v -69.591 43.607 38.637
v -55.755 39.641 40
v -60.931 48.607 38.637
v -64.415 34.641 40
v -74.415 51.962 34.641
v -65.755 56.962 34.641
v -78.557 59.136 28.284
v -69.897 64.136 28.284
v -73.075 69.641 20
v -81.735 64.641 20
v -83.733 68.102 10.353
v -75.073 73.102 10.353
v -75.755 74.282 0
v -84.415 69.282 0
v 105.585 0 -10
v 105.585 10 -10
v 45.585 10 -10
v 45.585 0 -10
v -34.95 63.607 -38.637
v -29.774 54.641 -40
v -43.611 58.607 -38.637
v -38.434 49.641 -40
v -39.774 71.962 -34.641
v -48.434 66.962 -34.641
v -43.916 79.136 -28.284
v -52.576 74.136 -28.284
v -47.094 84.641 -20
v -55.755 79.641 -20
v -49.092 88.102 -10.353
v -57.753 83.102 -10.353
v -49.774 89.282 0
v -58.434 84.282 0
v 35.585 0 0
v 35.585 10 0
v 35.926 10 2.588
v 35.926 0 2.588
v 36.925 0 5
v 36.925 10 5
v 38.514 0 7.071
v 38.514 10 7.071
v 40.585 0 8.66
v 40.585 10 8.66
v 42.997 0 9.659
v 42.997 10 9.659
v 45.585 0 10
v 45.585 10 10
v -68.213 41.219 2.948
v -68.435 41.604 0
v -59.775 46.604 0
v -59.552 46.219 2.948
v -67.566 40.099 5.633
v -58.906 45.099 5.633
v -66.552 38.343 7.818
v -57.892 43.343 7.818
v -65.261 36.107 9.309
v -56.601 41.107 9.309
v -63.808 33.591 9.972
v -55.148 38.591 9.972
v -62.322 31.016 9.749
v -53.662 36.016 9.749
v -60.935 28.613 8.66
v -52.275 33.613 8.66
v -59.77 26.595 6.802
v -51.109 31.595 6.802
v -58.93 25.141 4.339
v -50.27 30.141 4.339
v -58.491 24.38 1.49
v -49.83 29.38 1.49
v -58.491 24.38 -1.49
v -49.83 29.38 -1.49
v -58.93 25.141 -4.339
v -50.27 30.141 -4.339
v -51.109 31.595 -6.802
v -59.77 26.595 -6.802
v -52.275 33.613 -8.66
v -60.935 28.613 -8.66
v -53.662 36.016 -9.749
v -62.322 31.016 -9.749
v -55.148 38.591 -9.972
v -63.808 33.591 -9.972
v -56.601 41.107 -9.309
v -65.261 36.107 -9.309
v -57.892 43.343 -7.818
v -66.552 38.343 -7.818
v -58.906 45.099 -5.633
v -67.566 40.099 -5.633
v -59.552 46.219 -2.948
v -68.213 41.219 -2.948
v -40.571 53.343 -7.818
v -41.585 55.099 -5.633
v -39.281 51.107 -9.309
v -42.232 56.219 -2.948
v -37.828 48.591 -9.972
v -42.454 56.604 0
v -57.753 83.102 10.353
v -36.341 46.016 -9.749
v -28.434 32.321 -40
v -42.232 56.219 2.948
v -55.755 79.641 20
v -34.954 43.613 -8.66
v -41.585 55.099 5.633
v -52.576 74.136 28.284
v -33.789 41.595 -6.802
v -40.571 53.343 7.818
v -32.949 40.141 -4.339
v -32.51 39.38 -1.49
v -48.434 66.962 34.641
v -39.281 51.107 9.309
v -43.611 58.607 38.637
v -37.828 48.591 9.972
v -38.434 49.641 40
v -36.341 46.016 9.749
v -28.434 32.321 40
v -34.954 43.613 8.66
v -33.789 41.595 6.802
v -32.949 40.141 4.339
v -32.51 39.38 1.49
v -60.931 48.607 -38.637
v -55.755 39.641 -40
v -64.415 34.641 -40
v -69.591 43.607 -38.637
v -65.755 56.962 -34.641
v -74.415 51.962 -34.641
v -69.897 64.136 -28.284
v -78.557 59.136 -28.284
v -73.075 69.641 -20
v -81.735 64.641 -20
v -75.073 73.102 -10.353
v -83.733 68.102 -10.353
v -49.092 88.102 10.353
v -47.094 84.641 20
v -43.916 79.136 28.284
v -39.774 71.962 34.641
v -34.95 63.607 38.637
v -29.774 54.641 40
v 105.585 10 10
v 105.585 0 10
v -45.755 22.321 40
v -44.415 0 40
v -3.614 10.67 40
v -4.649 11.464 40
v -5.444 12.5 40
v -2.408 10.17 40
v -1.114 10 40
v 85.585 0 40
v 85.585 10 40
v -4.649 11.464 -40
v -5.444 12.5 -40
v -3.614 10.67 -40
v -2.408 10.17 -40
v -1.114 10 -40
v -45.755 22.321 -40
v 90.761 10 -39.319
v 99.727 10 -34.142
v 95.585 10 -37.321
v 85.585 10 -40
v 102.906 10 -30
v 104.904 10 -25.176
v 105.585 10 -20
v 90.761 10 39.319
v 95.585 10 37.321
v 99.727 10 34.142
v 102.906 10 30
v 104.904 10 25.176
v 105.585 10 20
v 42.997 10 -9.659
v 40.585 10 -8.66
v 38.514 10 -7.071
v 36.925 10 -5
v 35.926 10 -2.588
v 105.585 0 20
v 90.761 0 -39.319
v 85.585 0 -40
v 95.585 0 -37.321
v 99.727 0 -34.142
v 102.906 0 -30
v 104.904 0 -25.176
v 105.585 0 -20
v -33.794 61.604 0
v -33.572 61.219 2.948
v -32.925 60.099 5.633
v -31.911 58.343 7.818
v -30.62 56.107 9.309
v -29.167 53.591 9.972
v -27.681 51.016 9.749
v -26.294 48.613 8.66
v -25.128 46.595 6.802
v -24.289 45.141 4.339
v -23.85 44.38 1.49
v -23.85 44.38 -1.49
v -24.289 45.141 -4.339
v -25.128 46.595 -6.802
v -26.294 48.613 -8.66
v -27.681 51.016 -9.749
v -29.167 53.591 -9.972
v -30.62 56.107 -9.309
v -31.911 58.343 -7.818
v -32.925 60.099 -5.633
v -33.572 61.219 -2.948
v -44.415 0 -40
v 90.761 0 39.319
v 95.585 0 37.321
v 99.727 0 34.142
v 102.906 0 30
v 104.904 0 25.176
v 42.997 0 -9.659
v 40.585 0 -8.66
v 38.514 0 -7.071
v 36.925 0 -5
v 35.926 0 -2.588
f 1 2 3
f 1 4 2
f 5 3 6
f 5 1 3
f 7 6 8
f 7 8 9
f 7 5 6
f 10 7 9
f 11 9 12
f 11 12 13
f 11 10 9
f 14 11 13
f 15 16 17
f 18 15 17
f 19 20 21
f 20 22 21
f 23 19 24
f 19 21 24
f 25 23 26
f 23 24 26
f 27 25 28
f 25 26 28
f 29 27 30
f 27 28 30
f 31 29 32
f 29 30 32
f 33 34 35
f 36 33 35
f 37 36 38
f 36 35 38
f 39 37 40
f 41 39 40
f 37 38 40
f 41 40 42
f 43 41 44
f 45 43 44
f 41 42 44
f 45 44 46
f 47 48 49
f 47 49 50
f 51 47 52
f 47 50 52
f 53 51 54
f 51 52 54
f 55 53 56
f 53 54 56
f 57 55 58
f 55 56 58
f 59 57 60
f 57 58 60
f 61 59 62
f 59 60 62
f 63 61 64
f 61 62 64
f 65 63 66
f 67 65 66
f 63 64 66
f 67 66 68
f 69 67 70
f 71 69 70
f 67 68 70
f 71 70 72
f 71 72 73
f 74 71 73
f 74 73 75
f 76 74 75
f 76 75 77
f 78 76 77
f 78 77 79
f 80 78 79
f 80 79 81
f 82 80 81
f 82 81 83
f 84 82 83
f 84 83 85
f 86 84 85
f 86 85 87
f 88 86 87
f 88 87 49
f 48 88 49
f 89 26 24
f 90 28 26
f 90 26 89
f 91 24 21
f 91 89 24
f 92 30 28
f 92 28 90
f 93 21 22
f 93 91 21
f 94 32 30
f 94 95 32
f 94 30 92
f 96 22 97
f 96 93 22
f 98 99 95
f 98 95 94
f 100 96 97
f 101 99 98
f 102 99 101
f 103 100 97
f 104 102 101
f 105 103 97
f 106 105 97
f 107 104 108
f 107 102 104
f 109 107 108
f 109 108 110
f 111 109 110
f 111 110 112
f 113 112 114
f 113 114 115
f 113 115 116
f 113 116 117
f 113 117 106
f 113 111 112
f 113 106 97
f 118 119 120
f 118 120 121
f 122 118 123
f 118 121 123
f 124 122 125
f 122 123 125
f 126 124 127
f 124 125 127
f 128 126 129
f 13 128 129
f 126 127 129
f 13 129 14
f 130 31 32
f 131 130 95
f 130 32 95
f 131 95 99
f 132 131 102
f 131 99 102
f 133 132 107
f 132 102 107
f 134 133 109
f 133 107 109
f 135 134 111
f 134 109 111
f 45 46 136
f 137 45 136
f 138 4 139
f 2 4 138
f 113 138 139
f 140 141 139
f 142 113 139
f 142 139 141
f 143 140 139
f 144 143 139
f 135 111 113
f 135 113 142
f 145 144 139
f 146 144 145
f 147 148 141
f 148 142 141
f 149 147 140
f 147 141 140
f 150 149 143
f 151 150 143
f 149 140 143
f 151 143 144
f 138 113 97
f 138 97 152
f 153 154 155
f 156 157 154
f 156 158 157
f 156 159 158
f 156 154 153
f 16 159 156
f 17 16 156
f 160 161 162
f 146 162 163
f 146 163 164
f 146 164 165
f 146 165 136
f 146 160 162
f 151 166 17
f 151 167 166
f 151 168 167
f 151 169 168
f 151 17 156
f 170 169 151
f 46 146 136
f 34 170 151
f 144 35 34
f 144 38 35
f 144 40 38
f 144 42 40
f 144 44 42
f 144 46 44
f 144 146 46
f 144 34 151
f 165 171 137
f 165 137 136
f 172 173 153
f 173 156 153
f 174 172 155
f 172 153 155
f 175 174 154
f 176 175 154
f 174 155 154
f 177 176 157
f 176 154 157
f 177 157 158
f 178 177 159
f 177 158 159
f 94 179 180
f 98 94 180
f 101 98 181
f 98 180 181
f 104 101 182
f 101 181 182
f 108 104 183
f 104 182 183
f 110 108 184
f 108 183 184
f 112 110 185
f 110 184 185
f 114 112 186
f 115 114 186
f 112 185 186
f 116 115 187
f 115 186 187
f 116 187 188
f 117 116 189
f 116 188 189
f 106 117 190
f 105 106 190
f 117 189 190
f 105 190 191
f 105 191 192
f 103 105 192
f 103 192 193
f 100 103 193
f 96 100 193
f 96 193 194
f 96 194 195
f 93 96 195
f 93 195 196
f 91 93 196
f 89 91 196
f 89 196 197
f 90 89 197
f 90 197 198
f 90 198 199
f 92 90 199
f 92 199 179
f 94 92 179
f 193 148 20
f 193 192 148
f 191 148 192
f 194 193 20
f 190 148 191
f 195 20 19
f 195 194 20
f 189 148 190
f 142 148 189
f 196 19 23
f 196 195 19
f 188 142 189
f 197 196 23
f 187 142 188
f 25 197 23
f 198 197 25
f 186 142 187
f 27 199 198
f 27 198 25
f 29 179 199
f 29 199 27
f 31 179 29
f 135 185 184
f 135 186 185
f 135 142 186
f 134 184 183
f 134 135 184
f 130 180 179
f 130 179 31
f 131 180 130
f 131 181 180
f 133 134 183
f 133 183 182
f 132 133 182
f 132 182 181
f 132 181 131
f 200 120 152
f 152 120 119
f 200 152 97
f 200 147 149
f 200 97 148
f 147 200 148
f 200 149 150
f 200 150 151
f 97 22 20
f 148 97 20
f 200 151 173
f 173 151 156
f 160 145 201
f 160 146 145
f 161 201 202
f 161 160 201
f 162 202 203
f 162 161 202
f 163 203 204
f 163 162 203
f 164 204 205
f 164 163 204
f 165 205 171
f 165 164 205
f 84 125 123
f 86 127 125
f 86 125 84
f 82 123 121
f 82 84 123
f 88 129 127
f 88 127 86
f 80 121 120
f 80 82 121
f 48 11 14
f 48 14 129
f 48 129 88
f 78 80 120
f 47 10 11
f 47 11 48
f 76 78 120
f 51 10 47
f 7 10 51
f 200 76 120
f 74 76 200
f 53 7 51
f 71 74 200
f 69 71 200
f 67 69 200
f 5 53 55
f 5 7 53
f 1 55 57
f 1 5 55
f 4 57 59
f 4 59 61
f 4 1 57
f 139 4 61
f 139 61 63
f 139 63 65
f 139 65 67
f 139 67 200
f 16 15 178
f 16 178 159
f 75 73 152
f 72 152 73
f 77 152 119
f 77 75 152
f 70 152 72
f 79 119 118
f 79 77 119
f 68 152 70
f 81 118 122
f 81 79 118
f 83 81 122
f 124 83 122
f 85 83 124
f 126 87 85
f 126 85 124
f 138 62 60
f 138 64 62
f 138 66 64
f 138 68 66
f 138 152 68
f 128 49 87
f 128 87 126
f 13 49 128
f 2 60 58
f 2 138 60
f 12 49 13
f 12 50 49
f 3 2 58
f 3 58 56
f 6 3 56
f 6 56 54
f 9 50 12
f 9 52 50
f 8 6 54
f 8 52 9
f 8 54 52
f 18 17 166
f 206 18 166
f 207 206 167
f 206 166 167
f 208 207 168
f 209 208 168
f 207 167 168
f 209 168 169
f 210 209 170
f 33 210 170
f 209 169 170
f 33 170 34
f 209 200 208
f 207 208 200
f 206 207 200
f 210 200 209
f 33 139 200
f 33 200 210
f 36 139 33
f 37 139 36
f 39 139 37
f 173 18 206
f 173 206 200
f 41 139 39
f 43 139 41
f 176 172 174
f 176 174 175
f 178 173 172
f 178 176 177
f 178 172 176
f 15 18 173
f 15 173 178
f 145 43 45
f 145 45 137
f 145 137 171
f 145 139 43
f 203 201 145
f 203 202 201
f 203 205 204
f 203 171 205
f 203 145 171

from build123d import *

# Parameters (mm, degrees)
F1_DEPTH      = 40
F1_DEPTH_BACK = 40
F2_R          = 5
F3_R          = 39.99999
F4_R          = 10
F5_DEPTH      = 52.2
F7_DEPTH      = 25
F8_R          = 20


# Not quite as in the source:
# - a fillet or chamfer is up to 0.001 mm smaller than in the source, because OpenCascade refuses the exact size


with BuildPart() as f1:
    # F0 (on Top) → F1 (new body, two sides)
    with BuildSketch(Plane.XY) as f1_sk:
        Polygon((-44.4148934171, 0), (105.5851065829, 0), (105.5851065829, 10), (-4.0003745738, 10), (-49.7738772657, 89.2820323028), (-58.4341313035, 84.2820323028), (-28.4341313035, 32.3205080757), (-45.7546393792, 22.3205080757), (-75.7546393792, 74.2820323028), (-84.4148934171, 69.2820323028), align=None)
    extrude(amount=F1_DEPTH)
    extrude(f1_sk.sketch, amount=-F1_DEPTH_BACK)

    # F2
    f2_edges = [f1.edges().sort_by_distance(p)[0] for p in [
        (-4.000375, 10, 0),
    ]]
    fillet(f2_edges, radius=F2_R)

    # F3 (radius 40 in the source; OpenCascade refuses exactly that, so slightly less here)
    f3_edges = [f1.edges().sort_by_distance(p)[0] for p in [
        (-54.104004, 86.782032, 40),
        (-80.084766, 71.782032, 40),
        (-80.084766, 71.782032, -40),
        (-54.104004, 86.782032, -40),
    ]]
    fillet(f3_edges, radius=F3_R)

    # F4 (on face) → F5 (cut)
    with BuildSketch(Plane(origin=(1.3298460886, 0.7677869972, 0), x_dir=(-0.5, 0.8660254038, 0), z_dir=(0.8660254038, 0.5, 0))):
        with Locations((60.2471926707, 0)):
            Circle(F4_R)
    extrude(amount=-F5_DEPTH, mode=Mode.SUBTRACT)

    # F6 (on face) → F7 (cut)
    with BuildSketch(Plane(origin=(0, 10, 0), x_dir=(-1, 0, 0), z_dir=(0, 1, 0))):
        with BuildLine():
            ThreePointArc((-45.5851065829, -10), (-55.5851065829, 0), (-45.5851065829, 10))
            Line((-45.5851065829, 10), (-105.5851065829, 10))
            Line((-105.5851065829, 10), (-105.5851065829, -10))
            Line((-105.5851065829, -10), (-45.5851065829, -10))
        make_face()
        with BuildLine():
            ThreePointArc((-45.5851065829, -10), (-38.5140387711, -7.0710678119), (-35.5851065829, 0))
            ThreePointArc((-35.5851065829, 0), (-38.5140387711, 7.0710678119), (-45.5851065829, 10))
            ThreePointArc((-45.5851065829, 10), (-55.5851065829, 0), (-45.5851065829, -10))
        make_face()
    extrude(amount=-F7_DEPTH, mode=Mode.SUBTRACT)

    # F8
    f8_edges = [f1.edges().sort_by_distance(p)[0] for p in [
        (105.585107, 5, -40),
        (105.585107, 5, 40),
    ]]
    fillet(f8_edges, radius=F8_R)


solid = f1.part
